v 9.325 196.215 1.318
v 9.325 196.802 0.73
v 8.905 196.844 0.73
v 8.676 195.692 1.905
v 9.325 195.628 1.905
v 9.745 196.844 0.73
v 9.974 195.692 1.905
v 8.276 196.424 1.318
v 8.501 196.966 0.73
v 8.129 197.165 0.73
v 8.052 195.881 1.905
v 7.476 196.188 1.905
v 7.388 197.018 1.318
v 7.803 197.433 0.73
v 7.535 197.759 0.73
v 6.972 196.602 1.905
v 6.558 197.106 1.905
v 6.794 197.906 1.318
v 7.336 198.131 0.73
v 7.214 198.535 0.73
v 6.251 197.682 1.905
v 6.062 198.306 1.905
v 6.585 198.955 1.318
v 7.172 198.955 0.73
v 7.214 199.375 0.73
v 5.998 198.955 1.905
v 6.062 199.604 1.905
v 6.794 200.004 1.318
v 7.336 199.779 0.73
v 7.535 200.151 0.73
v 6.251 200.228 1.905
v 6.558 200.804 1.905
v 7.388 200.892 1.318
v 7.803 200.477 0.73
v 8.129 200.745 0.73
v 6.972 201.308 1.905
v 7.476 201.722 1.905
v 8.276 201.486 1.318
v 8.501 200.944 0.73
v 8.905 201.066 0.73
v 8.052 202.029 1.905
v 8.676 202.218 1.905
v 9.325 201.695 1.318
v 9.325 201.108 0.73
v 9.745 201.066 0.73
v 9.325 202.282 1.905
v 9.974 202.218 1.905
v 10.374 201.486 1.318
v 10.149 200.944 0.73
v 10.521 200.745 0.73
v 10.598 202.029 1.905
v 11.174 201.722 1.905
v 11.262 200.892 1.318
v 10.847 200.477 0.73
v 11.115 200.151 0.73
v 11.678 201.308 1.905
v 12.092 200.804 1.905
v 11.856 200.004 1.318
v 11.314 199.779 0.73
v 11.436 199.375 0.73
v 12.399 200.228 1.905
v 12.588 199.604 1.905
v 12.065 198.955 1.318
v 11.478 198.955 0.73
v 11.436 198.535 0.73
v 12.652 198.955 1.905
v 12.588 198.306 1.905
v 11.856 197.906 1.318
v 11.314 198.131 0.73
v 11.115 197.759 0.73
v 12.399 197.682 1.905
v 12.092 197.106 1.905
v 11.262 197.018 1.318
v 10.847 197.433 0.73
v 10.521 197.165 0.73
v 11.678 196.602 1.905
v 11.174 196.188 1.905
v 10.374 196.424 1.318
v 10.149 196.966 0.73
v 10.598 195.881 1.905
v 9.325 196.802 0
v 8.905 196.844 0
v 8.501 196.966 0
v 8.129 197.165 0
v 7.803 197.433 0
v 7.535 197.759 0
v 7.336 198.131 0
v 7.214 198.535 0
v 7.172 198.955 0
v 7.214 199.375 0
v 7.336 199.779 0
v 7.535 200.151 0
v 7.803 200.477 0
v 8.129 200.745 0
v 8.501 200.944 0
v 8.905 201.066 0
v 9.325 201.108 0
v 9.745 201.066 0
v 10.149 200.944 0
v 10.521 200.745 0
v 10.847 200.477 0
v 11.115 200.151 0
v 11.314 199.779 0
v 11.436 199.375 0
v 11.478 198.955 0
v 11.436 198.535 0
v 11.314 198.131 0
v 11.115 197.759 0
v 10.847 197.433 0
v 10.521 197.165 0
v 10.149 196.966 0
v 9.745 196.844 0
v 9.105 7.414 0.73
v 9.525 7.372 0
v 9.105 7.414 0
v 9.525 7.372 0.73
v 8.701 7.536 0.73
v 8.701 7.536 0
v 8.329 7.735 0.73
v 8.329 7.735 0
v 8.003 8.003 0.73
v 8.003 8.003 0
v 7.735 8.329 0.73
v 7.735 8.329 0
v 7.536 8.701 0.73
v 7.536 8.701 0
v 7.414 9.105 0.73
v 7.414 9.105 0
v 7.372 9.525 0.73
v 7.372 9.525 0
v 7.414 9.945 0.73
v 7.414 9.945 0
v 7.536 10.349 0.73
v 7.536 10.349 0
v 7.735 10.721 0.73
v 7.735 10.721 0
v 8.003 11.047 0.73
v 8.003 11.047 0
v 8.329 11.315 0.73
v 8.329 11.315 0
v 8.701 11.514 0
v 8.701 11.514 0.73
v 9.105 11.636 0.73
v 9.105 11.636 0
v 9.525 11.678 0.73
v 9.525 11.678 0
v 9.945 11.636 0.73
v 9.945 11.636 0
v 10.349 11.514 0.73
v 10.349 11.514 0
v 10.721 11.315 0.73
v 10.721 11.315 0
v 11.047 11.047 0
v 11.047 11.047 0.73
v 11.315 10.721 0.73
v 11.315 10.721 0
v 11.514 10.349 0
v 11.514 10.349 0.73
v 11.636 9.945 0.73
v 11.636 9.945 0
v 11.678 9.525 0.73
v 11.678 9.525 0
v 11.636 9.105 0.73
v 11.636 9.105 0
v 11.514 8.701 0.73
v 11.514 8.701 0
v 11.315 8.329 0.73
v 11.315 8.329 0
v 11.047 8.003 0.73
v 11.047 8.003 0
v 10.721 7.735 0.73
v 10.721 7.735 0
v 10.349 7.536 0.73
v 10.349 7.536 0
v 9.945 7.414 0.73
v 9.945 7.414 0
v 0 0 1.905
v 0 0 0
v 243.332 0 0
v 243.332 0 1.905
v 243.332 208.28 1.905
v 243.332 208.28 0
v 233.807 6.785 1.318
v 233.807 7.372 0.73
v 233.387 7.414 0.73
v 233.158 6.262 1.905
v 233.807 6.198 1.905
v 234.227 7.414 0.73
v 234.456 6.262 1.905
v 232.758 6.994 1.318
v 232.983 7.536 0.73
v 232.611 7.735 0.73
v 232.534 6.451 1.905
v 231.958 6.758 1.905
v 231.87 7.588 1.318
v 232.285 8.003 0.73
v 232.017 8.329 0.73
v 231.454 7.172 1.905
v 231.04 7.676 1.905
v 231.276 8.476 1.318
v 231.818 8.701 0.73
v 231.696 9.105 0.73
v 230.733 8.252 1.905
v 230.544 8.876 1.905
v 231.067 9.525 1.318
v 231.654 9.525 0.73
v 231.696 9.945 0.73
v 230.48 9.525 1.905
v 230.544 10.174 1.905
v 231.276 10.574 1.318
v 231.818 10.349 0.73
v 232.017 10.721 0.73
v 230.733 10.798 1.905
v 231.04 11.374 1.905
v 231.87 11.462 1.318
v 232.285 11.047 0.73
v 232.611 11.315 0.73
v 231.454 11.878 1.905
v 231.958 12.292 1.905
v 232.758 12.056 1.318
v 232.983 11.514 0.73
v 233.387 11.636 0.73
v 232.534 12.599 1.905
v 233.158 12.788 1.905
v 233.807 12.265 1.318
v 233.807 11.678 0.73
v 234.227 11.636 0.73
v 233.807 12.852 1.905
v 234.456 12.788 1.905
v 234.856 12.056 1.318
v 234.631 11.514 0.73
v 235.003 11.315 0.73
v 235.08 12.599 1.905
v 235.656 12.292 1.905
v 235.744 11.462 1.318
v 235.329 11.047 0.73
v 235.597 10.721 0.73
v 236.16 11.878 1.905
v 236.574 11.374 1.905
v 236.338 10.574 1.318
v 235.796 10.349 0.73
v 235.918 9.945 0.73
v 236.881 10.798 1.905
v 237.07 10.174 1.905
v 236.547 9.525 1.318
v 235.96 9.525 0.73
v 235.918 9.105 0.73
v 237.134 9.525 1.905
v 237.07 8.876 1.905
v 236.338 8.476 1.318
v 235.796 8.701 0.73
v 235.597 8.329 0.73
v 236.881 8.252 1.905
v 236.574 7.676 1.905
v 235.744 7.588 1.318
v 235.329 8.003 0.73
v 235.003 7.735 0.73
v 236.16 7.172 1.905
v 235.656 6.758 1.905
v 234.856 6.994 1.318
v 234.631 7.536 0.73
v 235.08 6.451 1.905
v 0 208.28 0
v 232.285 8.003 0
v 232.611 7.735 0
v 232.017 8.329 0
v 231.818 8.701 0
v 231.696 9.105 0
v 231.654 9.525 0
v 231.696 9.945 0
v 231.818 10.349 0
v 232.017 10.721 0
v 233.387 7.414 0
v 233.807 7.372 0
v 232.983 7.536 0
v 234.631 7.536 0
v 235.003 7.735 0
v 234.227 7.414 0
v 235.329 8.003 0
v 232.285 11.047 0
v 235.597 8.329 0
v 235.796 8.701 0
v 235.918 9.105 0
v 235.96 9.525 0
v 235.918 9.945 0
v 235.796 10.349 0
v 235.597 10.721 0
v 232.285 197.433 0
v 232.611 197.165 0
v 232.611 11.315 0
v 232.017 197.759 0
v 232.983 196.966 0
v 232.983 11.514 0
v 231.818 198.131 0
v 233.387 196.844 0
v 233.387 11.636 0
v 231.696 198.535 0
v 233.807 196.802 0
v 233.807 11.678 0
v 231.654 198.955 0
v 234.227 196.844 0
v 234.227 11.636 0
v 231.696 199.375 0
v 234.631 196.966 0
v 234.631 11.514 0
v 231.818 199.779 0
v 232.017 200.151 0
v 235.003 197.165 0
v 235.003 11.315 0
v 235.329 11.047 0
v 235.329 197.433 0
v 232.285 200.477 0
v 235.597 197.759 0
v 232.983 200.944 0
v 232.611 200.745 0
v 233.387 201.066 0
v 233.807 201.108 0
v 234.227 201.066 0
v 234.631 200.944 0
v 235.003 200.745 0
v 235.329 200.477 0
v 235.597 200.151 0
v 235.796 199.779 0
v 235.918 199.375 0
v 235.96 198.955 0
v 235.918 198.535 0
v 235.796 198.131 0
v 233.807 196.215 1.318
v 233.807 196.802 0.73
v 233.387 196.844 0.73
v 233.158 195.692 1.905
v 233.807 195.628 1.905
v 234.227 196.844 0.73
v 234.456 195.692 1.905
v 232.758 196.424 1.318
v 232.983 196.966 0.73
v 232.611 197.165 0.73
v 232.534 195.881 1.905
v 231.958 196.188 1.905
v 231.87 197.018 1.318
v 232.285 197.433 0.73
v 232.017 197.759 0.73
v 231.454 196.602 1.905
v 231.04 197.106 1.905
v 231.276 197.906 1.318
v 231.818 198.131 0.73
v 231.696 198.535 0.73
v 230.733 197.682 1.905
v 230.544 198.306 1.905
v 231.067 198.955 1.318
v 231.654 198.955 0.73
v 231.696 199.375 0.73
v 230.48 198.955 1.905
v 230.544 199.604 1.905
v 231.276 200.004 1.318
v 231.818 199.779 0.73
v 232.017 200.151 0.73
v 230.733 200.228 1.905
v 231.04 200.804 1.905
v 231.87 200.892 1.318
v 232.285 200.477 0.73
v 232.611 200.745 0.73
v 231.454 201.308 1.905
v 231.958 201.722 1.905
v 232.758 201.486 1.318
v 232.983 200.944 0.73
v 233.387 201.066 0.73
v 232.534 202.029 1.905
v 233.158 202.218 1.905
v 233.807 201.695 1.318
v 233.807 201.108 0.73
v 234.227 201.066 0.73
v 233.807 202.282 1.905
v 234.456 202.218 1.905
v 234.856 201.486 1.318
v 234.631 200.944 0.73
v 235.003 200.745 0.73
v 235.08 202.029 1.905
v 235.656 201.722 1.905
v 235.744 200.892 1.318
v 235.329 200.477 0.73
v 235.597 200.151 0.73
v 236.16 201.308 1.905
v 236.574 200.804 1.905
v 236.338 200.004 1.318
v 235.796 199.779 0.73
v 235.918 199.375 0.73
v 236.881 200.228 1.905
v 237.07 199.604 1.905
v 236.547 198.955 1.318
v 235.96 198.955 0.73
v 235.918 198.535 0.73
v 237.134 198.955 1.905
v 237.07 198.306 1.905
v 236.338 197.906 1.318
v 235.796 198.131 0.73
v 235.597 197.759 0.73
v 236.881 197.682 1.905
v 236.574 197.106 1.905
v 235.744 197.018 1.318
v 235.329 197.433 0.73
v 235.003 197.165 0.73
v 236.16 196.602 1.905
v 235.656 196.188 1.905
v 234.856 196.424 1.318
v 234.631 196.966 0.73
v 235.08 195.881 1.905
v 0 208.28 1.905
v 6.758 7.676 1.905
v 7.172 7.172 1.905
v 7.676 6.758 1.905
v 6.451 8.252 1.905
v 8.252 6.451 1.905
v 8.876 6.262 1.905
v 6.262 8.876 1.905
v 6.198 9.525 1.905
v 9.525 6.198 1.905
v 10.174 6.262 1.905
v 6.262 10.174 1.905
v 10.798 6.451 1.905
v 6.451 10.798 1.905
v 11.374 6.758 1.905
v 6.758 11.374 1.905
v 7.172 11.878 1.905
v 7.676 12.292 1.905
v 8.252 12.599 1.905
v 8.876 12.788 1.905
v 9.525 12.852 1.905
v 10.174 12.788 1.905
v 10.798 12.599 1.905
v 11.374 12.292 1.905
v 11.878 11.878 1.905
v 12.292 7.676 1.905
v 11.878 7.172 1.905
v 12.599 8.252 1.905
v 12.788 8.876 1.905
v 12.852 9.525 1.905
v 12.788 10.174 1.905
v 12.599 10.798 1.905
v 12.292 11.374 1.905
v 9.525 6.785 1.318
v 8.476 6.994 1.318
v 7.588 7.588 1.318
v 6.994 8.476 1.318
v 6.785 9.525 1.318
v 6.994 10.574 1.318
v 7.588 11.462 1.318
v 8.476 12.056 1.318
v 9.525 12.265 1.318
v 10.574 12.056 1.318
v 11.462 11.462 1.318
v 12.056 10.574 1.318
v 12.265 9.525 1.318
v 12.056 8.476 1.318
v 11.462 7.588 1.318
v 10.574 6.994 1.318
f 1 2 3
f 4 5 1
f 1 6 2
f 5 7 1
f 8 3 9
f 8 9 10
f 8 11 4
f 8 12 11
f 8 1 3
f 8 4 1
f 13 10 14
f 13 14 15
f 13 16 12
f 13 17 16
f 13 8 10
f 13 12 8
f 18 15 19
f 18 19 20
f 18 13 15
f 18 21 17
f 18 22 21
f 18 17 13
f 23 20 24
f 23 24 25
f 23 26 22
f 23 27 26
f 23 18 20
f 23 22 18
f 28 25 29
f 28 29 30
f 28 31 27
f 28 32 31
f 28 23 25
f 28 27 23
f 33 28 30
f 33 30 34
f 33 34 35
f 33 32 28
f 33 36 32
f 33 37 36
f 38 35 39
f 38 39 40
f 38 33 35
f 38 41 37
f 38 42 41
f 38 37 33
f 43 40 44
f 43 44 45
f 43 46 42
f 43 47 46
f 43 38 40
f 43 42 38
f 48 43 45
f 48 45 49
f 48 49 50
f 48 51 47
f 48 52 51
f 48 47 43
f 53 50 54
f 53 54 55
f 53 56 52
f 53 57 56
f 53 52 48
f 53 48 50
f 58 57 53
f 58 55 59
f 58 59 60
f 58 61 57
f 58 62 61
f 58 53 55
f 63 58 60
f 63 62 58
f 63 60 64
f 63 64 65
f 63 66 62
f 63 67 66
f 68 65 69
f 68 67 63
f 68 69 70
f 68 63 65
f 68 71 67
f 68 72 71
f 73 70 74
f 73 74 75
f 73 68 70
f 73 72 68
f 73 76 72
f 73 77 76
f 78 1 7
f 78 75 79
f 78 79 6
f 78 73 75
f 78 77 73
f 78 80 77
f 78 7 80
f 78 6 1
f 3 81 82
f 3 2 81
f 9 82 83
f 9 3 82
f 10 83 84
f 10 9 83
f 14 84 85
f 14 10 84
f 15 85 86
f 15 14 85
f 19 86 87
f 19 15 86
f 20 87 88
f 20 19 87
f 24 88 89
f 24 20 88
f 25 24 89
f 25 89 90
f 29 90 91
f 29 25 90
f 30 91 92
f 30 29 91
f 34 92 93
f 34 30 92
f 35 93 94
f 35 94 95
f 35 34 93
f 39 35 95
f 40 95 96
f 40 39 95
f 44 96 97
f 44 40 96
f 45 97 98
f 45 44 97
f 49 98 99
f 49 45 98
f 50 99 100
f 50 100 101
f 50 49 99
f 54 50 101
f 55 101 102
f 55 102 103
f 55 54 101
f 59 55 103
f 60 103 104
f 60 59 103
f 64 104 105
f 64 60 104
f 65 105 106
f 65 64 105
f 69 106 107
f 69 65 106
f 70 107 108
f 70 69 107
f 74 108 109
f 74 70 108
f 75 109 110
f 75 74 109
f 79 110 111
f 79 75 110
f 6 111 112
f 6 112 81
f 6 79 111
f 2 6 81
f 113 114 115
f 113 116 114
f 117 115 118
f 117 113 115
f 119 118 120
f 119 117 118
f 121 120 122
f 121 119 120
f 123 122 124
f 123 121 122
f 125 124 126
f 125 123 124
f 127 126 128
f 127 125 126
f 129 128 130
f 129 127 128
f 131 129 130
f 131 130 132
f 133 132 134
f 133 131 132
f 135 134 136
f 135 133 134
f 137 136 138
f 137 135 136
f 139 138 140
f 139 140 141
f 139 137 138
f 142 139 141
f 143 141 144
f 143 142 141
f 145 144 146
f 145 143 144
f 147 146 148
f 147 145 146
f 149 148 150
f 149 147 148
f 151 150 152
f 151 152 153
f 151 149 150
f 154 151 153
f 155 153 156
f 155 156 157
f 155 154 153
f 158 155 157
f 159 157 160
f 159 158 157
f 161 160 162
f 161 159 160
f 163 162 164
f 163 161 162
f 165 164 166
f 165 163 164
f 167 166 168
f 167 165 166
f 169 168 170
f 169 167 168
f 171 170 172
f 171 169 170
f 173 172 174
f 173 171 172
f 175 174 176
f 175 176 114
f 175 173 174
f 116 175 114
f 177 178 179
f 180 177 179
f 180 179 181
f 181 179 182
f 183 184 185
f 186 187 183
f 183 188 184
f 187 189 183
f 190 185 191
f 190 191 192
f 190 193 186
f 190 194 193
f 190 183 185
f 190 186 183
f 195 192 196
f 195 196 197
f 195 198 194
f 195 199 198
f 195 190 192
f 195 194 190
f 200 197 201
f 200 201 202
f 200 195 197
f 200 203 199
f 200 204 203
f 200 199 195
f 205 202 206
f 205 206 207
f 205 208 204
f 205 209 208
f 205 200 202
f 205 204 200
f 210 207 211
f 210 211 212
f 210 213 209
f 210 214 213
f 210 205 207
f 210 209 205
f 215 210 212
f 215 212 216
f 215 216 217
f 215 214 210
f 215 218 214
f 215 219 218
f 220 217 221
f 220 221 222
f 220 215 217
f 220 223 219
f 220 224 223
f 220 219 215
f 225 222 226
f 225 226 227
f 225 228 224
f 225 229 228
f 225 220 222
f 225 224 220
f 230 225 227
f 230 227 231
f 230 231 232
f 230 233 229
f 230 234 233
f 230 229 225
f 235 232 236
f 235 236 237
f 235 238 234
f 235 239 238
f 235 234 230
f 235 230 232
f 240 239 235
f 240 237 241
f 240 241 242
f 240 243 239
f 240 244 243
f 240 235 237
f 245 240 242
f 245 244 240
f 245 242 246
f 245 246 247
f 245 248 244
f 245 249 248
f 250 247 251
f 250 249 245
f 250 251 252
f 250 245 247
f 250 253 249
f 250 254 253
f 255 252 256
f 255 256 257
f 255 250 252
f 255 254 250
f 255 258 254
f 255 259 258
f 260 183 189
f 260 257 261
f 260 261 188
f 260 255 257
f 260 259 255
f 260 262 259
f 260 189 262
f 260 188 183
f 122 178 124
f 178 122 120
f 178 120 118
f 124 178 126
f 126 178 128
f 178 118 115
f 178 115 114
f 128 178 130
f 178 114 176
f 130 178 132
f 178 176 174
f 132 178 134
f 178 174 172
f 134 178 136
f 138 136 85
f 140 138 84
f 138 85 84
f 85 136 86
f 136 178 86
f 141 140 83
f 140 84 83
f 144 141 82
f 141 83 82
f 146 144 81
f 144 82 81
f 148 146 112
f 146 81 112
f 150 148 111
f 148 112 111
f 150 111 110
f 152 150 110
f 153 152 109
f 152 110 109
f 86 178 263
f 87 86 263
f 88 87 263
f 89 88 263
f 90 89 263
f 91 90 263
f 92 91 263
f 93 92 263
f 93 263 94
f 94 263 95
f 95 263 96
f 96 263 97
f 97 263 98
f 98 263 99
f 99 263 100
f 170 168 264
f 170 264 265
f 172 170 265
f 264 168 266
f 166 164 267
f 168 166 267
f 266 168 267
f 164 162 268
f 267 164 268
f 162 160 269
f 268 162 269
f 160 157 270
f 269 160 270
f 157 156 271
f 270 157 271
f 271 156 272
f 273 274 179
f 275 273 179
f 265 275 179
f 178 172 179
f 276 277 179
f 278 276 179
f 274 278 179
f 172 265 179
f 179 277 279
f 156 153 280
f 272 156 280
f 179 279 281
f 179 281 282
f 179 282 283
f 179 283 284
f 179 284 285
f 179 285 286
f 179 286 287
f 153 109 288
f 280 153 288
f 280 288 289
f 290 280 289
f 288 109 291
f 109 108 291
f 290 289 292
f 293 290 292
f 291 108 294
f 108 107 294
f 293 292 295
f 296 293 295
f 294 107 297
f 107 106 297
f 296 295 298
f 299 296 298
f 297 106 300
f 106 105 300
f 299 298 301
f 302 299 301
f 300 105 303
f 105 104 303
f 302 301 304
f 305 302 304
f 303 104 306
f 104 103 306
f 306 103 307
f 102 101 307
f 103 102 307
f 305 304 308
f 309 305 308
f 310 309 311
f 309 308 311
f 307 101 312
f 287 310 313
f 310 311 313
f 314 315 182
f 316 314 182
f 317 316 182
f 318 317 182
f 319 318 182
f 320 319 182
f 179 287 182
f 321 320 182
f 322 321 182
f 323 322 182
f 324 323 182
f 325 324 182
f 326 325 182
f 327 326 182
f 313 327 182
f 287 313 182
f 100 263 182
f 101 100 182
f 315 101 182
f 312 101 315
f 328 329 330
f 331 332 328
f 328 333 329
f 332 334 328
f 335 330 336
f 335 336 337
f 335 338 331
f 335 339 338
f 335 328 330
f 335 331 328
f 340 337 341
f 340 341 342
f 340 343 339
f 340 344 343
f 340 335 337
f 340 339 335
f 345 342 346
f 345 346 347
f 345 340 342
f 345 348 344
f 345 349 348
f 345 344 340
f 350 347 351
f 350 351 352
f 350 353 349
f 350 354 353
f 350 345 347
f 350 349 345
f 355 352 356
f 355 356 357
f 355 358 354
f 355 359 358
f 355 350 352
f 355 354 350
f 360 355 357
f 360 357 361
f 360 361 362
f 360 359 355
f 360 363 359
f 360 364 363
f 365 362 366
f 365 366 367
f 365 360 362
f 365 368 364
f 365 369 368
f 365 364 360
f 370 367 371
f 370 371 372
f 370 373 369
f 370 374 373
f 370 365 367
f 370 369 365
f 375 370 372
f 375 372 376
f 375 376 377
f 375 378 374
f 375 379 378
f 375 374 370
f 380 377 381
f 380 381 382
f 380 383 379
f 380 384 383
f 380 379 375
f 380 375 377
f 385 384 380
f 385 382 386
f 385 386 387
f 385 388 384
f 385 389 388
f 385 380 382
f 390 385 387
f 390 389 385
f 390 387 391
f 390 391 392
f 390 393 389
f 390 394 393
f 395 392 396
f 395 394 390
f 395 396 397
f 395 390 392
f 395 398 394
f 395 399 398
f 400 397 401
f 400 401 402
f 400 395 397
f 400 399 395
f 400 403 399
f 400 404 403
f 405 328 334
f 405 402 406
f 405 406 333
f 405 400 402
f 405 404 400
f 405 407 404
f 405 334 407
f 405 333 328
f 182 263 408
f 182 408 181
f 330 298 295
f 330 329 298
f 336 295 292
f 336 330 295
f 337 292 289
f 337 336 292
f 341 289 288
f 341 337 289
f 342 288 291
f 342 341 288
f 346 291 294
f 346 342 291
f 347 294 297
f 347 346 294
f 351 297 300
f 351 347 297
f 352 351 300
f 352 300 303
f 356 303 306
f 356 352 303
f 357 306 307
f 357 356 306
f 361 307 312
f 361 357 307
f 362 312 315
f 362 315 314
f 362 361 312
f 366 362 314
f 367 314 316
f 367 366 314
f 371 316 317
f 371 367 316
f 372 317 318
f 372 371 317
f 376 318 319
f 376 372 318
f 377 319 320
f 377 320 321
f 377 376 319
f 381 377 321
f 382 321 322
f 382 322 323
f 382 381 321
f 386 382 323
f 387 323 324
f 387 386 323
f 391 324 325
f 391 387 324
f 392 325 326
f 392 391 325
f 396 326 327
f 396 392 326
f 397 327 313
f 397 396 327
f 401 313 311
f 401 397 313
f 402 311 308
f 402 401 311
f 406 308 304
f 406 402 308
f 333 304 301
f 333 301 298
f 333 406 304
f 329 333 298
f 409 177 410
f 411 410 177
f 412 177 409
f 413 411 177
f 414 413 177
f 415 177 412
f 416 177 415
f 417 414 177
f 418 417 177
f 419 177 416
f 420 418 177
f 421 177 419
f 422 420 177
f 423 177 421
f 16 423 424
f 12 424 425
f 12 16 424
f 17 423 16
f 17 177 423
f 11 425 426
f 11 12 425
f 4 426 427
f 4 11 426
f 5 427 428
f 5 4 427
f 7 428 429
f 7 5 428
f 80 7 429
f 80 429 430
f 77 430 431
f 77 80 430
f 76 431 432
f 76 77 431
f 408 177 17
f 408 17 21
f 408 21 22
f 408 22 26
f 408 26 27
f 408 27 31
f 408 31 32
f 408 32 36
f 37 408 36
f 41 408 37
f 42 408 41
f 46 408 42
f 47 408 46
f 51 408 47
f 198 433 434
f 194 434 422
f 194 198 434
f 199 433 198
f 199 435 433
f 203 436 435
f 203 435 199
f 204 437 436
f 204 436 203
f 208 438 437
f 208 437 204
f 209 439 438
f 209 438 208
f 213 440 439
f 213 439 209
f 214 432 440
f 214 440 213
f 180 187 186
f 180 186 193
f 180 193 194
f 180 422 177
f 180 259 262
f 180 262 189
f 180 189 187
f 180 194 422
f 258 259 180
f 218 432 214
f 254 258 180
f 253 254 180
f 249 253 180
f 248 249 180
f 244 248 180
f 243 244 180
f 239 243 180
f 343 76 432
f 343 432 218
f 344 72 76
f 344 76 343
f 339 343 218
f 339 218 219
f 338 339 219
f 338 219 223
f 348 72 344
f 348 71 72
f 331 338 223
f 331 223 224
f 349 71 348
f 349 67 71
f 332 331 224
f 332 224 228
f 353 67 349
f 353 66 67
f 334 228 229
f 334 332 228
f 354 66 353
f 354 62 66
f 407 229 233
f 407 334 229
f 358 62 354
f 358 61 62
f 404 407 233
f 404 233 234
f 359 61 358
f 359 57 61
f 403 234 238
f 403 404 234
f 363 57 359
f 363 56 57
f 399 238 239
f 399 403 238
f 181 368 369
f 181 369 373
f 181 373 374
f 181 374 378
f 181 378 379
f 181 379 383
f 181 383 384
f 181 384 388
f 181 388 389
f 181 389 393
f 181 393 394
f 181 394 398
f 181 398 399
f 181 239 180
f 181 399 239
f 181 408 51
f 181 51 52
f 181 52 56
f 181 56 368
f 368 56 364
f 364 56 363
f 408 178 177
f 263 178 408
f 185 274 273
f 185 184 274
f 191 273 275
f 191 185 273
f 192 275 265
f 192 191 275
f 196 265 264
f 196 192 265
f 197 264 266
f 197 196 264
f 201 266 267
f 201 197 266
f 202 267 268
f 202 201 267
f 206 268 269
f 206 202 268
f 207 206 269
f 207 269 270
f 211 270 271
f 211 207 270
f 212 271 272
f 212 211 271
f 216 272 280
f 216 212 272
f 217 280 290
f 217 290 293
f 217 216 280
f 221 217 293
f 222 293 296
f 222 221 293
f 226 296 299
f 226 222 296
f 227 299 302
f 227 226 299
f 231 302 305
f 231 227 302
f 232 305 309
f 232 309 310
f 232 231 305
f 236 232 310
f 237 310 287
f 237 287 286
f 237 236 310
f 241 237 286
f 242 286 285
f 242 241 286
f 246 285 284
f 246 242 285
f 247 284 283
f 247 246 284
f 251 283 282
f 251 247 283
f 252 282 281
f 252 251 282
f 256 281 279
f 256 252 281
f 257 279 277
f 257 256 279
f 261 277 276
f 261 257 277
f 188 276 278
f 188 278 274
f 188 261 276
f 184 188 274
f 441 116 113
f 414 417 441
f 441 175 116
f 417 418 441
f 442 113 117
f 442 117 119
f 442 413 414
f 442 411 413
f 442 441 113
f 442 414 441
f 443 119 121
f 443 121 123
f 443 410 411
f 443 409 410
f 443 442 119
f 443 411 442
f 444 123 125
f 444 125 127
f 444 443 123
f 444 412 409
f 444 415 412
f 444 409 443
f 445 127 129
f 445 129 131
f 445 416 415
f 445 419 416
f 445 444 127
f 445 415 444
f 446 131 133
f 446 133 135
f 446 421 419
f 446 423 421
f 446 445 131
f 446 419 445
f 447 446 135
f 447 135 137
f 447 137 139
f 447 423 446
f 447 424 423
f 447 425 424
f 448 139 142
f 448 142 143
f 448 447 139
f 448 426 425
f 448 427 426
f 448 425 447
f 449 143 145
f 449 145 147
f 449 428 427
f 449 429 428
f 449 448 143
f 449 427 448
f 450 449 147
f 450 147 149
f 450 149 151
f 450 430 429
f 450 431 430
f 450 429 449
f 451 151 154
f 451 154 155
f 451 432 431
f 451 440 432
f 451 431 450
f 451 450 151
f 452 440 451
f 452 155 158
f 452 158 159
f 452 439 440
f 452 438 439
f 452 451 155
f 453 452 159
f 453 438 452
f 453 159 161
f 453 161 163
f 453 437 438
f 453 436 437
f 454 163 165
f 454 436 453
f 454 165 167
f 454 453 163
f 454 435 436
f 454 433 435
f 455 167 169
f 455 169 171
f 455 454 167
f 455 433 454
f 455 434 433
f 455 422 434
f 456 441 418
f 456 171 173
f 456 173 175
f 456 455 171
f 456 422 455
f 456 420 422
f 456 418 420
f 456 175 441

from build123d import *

# Parameters (mm, degrees)
SKETCH1_W                      = 243.332
SKETCH1_H                      = 208.28
BOSS_EXTRUDE1_DEPTH            = 1.905
F_6_CLEARANCE_HOLE1_AT_2_COUNT = 2
F_6_CLEARANCE_HOLE1_AT_2_PITCH = 224.482001
F_6_CLEARANCE_HOLE1_AT_3_COUNT = 2
F_6_CLEARANCE_HOLE1_AT_3_PITCH = 293.727584765
F_6_CLEARANCE_HOLE1_AT_4_COUNT = 2
F_6_CLEARANCE_HOLE1_AT_4_PITCH = 189.430106581


with BuildPart() as part:
    # Sketch1 → Boss-Extrude1 (new body)
    with BuildSketch(Plane.XY):
        with Locations((121.666, 104.14)):
            Rectangle(SKETCH1_W, SKETCH1_H)
    extrude(amount=BOSS_EXTRUDE1_DEPTH)

    # Sketch5 → #6 Clearance Hole1 (revolve, cut)
    with BuildSketch(Plane(origin=(9.324999, 198.955001, 1.905), x_dir=(0, -1, 0), z_dir=(1, 0, 0))):
        Polygon((0, 0), (0, 1.905), (2.15265, 1.905), (2.15265, 1.17475), (3.3274, 0), align=None)
    f_6_clearance_hole1 = revolve(axis=Axis((9.324999, 198.955001, 8.255), (0, 0, -1)), mode=Mode.SUBTRACT)

    # #6 Clearance Hole1 at 2: #6 Clearance Hole1 ×2
    with Locations(*[(i * F_6_CLEARANCE_HOLE1_AT_2_PITCH, 0, 0) for i in range(1, F_6_CLEARANCE_HOLE1_AT_2_COUNT)]):
        add(f_6_clearance_hole1, mode=Mode.SUBTRACT)

    # #6 Clearance Hole1 at 3: #6 Clearance Hole1 ×2
    with Locations(*[Vector(0.7642523639026707, -0.6449173003332906, 0) * (i * F_6_CLEARANCE_HOLE1_AT_3_PITCH) for i in range(1, F_6_CLEARANCE_HOLE1_AT_3_COUNT)]):
        add(f_6_clearance_hole1, mode=Mode.SUBTRACT)

    # #6 Clearance Hole1 at 4: #6 Clearance Hole1 ×2
    with Locations(*[Vector(0.0010558036608261825, -0.9999994426391596, 0) * (i * F_6_CLEARANCE_HOLE1_AT_4_PITCH) for i in range(1, F_6_CLEARANCE_HOLE1_AT_4_COUNT)]):
        add(f_6_clearance_hole1, mode=Mode.SUBTRACT)


solid = part.part
